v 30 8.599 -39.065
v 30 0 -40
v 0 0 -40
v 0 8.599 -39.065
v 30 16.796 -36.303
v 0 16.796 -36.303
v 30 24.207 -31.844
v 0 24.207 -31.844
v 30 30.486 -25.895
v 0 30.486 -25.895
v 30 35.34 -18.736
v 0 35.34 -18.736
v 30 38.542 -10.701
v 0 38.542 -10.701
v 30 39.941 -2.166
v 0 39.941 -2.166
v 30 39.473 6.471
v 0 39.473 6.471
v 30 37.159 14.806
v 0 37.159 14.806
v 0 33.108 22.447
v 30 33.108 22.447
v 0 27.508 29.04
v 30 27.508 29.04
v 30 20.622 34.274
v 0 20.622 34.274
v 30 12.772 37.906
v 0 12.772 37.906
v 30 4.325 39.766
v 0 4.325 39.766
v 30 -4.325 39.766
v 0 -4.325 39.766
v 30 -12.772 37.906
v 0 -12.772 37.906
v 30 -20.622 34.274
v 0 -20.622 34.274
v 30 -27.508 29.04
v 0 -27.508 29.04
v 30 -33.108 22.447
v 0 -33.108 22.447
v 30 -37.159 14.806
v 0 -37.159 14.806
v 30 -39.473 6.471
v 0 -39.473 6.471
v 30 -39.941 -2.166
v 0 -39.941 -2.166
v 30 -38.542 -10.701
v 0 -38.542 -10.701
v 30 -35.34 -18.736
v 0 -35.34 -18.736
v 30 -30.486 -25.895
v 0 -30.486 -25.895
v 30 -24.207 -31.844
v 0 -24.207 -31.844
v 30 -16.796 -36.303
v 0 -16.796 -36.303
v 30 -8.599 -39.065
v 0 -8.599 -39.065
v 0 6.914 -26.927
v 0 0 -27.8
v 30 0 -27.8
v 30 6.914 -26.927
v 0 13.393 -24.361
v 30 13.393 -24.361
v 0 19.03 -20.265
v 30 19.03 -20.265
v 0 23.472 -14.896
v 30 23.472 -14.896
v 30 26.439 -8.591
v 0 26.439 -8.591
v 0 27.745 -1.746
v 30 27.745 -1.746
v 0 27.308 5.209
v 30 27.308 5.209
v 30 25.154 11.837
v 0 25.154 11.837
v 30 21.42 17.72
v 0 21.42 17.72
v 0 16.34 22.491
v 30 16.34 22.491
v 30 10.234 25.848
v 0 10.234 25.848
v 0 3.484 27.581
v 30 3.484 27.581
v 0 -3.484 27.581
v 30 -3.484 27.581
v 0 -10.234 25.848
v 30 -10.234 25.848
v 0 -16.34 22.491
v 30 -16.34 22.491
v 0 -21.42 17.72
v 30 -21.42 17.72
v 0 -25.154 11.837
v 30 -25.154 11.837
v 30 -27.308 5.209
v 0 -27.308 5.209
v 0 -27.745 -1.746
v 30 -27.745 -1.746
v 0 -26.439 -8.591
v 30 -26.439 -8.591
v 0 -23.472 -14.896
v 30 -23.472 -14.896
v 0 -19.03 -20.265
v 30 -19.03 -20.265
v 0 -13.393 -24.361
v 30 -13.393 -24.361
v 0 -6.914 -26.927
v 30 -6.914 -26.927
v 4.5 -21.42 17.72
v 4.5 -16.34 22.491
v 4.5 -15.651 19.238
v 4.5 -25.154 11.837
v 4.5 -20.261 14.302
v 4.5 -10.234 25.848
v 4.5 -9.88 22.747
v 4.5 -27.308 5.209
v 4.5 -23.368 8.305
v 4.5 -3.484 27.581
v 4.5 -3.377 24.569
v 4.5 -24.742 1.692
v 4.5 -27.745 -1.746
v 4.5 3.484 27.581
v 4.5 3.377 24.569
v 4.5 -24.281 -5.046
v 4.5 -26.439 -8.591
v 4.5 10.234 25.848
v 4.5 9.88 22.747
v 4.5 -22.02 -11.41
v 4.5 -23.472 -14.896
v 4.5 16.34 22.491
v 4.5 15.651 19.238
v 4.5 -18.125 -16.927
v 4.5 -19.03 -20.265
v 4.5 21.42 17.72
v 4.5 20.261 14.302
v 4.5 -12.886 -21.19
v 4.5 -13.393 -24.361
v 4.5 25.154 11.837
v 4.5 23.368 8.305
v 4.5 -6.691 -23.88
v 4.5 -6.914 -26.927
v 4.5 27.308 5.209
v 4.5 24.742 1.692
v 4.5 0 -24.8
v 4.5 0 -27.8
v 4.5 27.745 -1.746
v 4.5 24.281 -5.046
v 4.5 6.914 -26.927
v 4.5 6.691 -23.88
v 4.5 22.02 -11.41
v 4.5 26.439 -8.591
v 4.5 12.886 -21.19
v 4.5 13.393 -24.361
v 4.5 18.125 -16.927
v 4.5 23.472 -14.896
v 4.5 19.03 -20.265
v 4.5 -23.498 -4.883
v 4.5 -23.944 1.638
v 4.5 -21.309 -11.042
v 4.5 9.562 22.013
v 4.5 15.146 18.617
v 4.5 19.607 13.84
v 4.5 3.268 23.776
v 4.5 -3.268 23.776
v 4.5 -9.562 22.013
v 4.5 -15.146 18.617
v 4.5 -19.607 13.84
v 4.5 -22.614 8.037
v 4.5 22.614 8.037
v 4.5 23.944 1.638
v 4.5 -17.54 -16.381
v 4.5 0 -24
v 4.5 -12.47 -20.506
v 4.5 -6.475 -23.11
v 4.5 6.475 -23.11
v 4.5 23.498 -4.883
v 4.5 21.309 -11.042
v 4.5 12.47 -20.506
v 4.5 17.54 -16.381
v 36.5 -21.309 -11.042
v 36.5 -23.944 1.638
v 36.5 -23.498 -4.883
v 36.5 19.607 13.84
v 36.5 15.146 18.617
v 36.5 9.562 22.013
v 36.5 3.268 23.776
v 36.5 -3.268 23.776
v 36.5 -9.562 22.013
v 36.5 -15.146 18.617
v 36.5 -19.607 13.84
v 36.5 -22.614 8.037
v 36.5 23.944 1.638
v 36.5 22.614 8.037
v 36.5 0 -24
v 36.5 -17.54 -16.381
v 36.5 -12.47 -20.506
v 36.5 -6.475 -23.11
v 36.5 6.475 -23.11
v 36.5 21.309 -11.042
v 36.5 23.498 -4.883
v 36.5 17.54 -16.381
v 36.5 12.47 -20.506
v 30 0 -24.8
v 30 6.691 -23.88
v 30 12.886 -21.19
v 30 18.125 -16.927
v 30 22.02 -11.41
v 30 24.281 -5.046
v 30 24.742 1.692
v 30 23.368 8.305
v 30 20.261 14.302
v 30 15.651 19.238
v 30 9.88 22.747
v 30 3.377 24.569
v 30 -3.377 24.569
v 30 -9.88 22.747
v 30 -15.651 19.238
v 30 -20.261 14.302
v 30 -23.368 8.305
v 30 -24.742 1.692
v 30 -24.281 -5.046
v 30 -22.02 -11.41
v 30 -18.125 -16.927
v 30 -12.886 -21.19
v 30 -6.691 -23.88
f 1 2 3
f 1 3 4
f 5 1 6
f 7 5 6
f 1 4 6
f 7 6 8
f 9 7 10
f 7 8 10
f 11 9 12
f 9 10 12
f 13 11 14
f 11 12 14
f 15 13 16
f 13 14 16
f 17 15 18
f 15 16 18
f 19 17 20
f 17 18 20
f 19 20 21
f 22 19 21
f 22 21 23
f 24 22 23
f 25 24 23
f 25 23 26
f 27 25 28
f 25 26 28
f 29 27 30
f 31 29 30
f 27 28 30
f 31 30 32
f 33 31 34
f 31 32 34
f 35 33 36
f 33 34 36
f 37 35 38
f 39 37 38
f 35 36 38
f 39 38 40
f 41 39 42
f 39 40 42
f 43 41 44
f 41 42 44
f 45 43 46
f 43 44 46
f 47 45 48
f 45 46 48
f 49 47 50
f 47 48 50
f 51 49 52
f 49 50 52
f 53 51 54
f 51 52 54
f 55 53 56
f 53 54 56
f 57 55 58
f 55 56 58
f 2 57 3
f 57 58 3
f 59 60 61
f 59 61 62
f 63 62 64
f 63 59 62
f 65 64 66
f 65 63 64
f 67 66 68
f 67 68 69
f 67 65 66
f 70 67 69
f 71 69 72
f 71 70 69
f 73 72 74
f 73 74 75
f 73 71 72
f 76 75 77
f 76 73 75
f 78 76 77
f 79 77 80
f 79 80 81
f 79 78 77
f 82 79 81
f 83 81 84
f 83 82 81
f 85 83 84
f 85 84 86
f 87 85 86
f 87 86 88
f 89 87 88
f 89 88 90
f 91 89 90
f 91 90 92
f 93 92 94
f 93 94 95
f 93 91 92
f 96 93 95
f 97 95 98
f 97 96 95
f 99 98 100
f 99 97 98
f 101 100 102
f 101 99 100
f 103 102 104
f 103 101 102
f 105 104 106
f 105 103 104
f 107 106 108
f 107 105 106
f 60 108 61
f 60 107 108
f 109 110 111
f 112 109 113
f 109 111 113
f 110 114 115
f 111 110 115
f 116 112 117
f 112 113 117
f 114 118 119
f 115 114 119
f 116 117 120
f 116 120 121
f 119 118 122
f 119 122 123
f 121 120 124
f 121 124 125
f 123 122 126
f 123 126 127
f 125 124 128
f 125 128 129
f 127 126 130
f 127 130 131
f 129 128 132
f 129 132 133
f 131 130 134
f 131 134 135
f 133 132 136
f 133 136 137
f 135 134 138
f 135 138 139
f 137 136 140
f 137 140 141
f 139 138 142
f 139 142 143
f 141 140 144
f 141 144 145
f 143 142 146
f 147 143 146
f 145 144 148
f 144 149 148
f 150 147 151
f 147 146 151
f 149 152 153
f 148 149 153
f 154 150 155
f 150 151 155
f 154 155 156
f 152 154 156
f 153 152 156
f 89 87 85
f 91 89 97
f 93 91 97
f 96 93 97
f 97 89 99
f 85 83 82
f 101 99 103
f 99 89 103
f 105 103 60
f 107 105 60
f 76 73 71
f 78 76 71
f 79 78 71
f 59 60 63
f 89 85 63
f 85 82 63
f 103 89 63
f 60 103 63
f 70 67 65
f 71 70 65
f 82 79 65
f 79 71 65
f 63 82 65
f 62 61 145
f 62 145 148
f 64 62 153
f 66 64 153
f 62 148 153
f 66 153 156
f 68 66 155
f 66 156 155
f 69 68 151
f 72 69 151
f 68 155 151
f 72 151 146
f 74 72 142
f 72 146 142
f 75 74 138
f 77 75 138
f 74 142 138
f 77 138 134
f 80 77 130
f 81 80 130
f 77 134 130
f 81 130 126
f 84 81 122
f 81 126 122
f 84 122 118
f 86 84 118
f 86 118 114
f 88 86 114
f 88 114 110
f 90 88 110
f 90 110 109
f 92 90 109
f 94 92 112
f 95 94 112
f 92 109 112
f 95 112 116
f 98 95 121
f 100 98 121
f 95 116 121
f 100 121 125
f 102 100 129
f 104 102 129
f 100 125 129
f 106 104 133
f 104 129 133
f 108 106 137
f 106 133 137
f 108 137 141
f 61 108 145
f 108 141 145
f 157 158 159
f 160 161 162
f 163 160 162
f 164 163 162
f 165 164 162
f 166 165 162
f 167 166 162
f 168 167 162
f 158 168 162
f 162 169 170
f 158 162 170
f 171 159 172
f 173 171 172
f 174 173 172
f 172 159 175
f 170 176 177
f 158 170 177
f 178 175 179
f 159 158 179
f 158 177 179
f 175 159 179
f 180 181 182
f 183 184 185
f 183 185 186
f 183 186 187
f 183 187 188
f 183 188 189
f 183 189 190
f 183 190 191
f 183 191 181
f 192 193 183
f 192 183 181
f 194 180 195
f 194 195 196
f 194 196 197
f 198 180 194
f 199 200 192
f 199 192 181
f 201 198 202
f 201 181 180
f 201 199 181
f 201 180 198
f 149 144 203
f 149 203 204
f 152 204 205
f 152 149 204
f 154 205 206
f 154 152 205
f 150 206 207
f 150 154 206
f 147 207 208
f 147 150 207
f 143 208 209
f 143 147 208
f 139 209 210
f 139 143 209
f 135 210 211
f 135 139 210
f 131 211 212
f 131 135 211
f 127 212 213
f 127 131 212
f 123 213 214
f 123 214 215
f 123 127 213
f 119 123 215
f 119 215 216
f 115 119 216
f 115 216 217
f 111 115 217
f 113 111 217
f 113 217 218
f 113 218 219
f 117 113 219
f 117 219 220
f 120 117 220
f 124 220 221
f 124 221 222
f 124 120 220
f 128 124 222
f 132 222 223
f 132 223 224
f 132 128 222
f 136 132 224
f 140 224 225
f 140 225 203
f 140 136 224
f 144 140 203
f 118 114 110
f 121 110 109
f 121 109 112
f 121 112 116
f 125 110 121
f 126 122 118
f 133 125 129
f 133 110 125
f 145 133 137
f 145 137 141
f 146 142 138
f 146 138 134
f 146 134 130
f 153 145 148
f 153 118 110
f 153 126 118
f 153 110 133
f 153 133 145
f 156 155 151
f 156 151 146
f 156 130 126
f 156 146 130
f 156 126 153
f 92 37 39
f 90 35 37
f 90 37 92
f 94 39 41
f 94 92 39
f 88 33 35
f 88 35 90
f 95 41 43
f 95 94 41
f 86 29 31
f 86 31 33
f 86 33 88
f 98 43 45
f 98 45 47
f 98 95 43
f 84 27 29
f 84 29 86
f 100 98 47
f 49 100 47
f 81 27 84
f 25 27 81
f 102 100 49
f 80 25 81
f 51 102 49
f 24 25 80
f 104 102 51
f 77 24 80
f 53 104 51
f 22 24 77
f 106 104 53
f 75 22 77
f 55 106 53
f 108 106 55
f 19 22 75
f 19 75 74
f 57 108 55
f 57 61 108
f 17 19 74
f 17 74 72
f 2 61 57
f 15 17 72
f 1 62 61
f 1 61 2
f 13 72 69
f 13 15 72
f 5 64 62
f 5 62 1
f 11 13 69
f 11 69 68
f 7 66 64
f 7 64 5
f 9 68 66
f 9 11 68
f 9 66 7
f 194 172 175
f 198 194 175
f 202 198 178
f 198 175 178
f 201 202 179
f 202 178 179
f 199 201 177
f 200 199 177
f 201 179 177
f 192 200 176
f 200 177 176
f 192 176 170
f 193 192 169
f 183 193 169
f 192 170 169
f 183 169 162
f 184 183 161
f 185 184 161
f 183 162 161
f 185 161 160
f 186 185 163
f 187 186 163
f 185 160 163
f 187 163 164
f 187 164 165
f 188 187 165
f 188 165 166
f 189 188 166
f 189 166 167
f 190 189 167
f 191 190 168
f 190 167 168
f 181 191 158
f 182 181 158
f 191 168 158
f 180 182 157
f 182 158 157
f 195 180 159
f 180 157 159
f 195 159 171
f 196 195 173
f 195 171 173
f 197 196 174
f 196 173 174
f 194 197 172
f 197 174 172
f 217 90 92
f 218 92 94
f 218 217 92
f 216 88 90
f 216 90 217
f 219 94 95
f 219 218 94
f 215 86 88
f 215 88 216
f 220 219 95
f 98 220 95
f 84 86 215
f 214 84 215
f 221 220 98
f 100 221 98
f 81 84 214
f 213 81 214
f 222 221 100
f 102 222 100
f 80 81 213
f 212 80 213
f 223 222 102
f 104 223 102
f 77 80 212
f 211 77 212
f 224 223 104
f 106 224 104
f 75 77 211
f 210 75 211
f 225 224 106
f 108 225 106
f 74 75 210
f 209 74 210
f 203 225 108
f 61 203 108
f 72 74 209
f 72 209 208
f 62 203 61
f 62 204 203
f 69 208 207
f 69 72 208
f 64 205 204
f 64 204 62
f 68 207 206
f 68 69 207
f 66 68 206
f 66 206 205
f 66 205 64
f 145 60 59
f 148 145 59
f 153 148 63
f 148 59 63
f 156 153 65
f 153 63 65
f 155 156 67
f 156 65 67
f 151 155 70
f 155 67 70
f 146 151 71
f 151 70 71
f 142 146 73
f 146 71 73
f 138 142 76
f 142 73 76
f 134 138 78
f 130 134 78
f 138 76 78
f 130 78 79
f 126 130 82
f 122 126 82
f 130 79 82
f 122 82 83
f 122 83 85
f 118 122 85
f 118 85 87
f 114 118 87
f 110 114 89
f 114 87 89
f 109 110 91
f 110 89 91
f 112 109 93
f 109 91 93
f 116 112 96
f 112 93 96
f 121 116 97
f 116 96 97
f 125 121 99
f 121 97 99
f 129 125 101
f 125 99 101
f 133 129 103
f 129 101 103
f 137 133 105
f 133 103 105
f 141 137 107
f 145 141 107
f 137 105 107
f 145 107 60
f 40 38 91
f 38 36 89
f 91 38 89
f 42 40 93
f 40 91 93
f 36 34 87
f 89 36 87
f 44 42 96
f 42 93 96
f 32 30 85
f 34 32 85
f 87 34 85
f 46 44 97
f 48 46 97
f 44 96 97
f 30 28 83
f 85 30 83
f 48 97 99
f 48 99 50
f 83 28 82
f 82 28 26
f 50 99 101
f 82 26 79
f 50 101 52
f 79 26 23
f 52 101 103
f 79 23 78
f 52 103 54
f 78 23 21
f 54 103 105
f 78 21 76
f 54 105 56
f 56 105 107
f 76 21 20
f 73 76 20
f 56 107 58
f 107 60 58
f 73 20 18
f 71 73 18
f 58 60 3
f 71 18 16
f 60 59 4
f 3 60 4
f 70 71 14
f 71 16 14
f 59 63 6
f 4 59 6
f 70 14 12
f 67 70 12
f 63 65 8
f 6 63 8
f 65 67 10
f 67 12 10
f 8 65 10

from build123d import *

# Parameters (mm, degrees)
SKETCH1_R      = 27.8
CUPFLOOR_DEPTH = 4.5
CUPWALL_START  = 4.5
SKETCH2_R      = 27.8
SKETCH2_R_2    = 24.8
CUPWALL_DEPTH  = 25.5
MOTOR_START    = 4.5
SKETCH3_R      = 24
MOTOR_DEPTH    = 32
SKETCH4_R      = 40
SKETCH4_R_2    = 27.8
FOAM_DEPTH     = 30


with BuildPart() as part:
    # Sketch1 → CupFloor (new body)
    with BuildSketch(Plane(origin=(0, 0, 0), x_dir=(0, 0, -1), z_dir=(1, 0, 0))):
        Circle(SKETCH1_R)
    extrude(amount=CUPFLOOR_DEPTH)


with BuildPart() as body_2:
    # Sketch2 → CupWall (new body)
    with BuildSketch(Plane(origin=(0, 0, 0), x_dir=(0, 0, -1), z_dir=(1, 0, 0)).offset(CUPWALL_START)):
        Circle(SKETCH2_R)
        Circle(SKETCH2_R_2, mode=Mode.SUBTRACT)
    extrude(amount=CUPWALL_DEPTH)


with BuildPart() as body_3:
    # Sketch3 → Motor (new body)
    with BuildSketch(Plane(origin=(0, 0, 0), x_dir=(0, 0, -1), z_dir=(1, 0, 0)).offset(MOTOR_START)):
        Circle(SKETCH3_R)
    extrude(amount=MOTOR_DEPTH)


with BuildPart() as body_4:
    # Sketch4 → Foam (new body)
    with BuildSketch(Plane(origin=(0, 0, 0), x_dir=(0, 0, -1), z_dir=(1, 0, 0))):
        Circle(SKETCH4_R)
        Circle(SKETCH4_R_2, mode=Mode.SUBTRACT)
    extrude(amount=FOAM_DEPTH)


solid = Compound([part.part, body_2.part, body_3.part, body_4.part])
